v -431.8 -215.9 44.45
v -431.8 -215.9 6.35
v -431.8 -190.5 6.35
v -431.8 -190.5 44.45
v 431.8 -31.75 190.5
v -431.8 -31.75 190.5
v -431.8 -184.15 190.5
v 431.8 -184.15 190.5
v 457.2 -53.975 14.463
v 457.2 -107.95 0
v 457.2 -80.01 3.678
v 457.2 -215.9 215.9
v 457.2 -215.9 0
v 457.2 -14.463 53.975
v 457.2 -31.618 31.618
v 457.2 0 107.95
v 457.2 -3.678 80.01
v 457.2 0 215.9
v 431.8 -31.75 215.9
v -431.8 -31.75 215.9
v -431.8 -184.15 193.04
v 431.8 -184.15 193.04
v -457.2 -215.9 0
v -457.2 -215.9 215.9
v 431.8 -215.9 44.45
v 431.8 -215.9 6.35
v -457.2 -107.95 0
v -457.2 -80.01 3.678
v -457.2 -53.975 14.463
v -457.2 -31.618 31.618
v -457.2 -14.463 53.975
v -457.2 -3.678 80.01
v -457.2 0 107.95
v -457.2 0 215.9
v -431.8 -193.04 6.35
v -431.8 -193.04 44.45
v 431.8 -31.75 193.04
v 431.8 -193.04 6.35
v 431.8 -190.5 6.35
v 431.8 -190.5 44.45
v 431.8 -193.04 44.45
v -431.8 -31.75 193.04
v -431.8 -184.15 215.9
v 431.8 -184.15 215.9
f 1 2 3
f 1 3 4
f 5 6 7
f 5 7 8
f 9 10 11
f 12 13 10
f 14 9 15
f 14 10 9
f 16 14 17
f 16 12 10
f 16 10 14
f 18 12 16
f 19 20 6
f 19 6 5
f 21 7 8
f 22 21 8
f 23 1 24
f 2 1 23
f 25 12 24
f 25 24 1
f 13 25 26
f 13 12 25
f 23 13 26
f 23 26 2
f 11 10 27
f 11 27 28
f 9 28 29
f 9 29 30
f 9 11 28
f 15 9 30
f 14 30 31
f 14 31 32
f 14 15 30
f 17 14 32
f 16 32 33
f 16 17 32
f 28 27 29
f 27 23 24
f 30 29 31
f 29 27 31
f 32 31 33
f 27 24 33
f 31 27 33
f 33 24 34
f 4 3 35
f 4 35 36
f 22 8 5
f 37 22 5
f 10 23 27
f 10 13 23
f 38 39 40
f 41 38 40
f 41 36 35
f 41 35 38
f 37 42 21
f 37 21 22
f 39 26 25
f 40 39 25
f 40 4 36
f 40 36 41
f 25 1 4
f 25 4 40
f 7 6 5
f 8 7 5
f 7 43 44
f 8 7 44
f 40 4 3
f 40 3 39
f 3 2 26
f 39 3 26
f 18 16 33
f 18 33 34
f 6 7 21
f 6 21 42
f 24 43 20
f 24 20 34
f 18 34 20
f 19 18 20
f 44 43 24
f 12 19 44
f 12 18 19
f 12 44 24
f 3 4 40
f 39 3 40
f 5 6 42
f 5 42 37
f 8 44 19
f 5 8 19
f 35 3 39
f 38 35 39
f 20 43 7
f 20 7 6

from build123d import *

# Parameters (mm, degrees)
F1_DEPTH = 457.2
F2_W     = 863.6
F2_H     = 38.1
F3_DEPTH = 25.4
F4_W     = 863.6
F4_H     = 152.4
F5_DEPTH = 25.4
F6_DEPTH = 2.54
F7_DEPTH = 2.54


with BuildPart() as f1:
    # F0 (on Right) → F1 (new body, symmetric)
    with BuildSketch(Plane.YZ):
        with BuildLine():
            Line((-215.9, 0), (-107.95, 0))
            ThreePointArc((-107.95, 0), (-31.6178229709, 31.6178229709), (0, 107.95))
            Line((0, 107.95), (0, 215.9))
            Line((0, 215.9), (-215.9, 215.9))
            Line((-215.9, 215.9), (-215.9, 0))
        make_face()
    extrude(amount=F1_DEPTH, both=True)

    # F2 (on face) → F3 (cut)
    with BuildSketch(Plane.XZ.offset(215.9)):
        with Locations((0, 25.4)):
            Rectangle(F2_W, F2_H)
    extrude(amount=-F3_DEPTH, mode=Mode.SUBTRACT)

    # F4 (on face) → F5 (cut)
    with BuildSketch(Plane.XY.offset(215.9)):
        with Locations((0, -107.95)):
            Rectangle(F4_W, F4_H)
    extrude(amount=-F5_DEPTH, mode=Mode.SUBTRACT)


with BuildPart() as f6:
    # F6 (new): a face of the model
    f6_faces = [f1.part.faces().sort_by_distance(p)[0] for p in [
        (0, -107.95, 190.5),
    ]]
    extrude(f6_faces, amount=F6_DEPTH)


with BuildPart() as f7:
    # F7 (new): a face of the model
    f7_faces = [f1.part.faces().sort_by_distance(p)[0] for p in [
        (0, -190.5, 25.4),
    ]]
    extrude(f7_faces, amount=F7_DEPTH)


solid = Compound([f1.part, f6.part, f7.part])
